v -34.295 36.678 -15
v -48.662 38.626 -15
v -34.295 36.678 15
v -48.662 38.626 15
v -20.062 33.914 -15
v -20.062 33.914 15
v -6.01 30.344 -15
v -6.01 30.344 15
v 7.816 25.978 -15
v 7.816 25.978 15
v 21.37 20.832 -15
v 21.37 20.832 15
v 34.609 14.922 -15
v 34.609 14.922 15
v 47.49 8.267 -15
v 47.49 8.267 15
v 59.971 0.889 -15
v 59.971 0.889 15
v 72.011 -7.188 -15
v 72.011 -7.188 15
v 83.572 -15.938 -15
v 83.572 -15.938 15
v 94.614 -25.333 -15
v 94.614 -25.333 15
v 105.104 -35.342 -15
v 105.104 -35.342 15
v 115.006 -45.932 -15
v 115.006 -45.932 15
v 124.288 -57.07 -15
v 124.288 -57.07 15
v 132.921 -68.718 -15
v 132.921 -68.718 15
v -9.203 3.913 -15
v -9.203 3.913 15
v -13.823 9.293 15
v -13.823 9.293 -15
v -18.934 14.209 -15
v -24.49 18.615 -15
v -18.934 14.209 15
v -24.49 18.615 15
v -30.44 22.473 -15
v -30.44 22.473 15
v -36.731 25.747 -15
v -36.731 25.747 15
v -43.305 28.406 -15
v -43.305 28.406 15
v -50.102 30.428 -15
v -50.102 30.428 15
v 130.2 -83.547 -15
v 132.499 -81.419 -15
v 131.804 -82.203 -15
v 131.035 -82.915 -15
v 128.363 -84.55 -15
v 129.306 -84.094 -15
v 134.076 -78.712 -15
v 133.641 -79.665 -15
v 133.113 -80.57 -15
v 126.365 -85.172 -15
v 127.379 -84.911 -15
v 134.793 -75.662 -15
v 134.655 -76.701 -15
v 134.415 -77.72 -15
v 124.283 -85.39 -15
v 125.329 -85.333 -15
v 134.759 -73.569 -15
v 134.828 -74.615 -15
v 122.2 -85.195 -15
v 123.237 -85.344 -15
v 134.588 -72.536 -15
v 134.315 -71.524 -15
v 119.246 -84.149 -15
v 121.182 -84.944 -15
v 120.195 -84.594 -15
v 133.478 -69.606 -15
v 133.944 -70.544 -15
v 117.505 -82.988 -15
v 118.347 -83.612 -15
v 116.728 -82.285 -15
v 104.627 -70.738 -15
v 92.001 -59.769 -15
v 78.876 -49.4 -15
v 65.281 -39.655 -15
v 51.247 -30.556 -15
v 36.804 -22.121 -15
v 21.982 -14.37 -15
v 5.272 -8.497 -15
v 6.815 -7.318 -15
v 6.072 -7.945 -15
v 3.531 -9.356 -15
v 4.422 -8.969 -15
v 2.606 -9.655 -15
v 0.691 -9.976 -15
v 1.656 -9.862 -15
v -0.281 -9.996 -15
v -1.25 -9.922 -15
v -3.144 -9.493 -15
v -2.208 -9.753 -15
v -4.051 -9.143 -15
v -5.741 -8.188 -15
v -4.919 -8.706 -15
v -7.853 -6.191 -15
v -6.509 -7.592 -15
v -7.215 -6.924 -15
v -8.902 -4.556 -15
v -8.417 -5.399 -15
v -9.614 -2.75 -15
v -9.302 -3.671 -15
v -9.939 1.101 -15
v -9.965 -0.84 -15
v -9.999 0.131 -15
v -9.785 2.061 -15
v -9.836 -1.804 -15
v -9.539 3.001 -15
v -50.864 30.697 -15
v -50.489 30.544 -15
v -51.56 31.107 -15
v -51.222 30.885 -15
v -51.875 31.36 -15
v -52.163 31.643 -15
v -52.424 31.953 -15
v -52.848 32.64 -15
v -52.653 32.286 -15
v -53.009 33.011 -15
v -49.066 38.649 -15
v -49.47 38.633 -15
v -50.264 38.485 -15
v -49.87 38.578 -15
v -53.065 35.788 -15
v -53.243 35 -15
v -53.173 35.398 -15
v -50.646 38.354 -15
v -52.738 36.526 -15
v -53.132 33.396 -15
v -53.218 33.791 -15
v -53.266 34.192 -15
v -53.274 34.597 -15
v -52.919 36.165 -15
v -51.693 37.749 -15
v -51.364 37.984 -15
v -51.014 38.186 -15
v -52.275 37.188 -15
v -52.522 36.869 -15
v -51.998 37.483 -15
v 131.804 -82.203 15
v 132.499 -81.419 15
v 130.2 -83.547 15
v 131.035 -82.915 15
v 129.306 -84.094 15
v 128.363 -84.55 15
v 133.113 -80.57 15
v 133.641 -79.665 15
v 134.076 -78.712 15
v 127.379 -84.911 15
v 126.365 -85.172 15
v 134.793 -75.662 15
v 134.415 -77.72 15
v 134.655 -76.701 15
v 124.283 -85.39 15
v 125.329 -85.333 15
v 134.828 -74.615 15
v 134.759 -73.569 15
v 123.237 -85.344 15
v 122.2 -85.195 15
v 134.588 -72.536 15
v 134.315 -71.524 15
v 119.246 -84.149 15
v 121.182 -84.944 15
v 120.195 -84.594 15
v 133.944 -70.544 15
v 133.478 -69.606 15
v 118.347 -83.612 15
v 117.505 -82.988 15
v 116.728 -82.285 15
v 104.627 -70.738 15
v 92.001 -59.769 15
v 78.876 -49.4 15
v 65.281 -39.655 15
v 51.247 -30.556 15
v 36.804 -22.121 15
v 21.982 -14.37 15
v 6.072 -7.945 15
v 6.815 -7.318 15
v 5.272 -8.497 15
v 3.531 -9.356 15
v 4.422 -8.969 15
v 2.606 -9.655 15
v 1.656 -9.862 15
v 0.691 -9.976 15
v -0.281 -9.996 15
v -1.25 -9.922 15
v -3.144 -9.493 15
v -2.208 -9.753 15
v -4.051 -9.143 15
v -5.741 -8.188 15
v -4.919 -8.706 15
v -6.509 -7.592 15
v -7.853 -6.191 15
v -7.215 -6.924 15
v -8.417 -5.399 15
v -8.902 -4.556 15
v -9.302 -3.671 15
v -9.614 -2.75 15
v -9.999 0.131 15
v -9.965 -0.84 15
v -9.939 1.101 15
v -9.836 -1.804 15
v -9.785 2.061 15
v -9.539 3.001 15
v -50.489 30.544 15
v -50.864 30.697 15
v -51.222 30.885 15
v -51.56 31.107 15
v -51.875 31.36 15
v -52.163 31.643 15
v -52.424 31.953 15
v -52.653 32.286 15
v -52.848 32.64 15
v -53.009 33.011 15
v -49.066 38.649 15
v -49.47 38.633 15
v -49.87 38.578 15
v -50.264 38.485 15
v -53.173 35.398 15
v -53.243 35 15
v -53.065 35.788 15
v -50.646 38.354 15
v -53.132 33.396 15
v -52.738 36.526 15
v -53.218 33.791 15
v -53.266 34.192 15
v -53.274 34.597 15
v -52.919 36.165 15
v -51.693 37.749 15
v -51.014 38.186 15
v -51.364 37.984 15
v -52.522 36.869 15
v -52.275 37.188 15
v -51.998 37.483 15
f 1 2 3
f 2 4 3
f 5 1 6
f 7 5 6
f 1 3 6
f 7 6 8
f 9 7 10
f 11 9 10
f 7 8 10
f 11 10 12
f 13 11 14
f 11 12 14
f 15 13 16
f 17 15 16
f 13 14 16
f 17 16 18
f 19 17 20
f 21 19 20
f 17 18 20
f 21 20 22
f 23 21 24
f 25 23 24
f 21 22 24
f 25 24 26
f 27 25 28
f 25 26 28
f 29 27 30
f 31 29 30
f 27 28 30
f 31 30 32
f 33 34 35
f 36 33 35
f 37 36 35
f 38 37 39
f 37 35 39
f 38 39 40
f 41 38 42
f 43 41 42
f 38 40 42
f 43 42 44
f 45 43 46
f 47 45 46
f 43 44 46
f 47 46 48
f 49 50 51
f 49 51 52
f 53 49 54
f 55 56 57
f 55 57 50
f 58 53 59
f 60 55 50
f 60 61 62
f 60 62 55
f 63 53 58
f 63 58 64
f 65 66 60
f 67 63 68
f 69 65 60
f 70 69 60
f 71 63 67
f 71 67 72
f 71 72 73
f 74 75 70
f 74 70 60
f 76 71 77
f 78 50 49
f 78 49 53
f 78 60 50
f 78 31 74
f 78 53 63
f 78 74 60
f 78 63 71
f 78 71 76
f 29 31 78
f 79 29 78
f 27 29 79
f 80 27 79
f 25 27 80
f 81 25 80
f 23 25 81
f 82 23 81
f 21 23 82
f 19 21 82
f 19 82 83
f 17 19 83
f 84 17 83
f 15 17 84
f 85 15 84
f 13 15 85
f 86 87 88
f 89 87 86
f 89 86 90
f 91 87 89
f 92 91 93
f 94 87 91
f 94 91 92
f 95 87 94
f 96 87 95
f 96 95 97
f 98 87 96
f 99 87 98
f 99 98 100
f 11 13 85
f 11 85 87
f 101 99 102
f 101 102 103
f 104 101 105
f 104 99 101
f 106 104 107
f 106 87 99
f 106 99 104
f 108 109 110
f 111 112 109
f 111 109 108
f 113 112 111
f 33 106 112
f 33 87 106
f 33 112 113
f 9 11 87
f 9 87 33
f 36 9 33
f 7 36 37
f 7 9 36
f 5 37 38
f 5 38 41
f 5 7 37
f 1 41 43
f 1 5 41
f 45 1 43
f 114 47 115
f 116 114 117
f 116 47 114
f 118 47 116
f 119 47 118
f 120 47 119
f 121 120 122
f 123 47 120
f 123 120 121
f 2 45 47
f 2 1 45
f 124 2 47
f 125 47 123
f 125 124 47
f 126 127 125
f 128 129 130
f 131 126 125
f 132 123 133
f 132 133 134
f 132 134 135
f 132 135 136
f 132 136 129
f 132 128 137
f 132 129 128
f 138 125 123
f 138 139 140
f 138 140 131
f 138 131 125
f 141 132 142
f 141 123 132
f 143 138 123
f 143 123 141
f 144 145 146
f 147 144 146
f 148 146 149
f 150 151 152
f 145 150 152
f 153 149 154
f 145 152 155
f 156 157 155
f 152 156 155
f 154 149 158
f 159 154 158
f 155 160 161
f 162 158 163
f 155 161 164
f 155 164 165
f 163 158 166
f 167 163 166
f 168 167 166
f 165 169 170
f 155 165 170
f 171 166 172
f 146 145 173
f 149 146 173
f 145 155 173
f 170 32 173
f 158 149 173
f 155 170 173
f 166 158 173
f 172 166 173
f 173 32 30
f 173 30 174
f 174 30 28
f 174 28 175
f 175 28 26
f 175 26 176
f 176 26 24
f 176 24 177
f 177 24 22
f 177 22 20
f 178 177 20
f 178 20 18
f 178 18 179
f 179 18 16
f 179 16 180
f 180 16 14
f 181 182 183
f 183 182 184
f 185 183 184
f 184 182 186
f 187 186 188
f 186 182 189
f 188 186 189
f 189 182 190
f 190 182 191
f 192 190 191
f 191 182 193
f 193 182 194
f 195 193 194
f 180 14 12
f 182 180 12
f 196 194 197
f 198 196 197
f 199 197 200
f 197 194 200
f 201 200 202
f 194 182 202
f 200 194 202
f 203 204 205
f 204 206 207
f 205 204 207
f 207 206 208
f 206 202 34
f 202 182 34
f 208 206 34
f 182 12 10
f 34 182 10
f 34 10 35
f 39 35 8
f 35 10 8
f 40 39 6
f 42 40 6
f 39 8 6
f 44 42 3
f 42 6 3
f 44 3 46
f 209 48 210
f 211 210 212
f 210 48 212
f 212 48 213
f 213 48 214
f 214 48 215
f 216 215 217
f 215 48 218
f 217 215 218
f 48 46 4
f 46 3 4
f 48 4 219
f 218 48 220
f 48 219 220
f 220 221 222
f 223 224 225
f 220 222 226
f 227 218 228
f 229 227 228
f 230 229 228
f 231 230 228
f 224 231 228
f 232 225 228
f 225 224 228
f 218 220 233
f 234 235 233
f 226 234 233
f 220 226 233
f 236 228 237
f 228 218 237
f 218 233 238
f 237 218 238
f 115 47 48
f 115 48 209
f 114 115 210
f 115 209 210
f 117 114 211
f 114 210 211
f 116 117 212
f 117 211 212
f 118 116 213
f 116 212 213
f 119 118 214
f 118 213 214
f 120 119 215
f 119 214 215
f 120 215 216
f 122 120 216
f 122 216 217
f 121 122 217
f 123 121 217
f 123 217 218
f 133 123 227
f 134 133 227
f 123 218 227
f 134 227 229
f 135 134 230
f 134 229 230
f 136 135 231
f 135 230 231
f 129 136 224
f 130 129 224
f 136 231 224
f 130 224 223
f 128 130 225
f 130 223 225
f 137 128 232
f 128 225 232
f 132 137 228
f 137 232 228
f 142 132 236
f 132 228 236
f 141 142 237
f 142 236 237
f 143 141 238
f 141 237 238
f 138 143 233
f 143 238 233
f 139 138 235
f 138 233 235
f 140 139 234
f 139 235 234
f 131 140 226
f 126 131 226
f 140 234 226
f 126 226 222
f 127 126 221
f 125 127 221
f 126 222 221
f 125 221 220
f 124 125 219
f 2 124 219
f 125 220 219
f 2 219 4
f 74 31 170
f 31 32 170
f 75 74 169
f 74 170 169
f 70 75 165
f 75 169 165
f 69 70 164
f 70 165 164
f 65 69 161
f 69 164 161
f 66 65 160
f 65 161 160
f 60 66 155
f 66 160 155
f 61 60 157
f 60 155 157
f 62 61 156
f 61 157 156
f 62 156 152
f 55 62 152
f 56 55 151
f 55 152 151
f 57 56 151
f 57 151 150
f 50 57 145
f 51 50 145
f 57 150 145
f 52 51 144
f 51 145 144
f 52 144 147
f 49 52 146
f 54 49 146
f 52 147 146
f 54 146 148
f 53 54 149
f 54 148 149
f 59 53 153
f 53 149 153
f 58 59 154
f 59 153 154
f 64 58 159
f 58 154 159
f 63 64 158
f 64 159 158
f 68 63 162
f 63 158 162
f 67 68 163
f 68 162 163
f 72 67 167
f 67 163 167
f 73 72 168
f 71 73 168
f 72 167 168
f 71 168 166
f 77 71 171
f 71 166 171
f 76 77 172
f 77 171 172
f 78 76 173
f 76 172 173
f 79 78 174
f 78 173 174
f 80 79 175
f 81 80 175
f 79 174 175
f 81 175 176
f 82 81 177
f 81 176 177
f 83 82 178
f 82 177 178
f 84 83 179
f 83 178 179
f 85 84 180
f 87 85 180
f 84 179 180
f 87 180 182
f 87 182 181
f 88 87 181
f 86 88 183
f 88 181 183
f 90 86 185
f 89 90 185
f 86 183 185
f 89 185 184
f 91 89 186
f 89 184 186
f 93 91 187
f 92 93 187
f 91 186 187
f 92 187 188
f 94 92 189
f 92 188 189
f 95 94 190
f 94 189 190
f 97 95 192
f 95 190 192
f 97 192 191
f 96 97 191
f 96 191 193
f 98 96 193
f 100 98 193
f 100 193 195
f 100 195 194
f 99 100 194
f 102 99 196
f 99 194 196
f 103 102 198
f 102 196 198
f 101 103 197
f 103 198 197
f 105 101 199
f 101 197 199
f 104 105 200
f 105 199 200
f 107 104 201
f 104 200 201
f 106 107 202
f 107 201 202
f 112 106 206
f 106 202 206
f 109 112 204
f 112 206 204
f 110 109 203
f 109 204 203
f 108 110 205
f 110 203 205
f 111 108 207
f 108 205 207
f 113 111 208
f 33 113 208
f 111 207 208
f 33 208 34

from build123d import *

# Parameters (mm, degrees)
EXTRUDE_1_DEPTH = 15


with BuildPart() as part:
    # 草图2 → 凸台-拉伸1 (new, symmetric)
    with BuildSketch(Plane.XY):
        with BuildLine():
            ThreePointArc((-50.101760938, 30.428374824), (-53.212480705, 35.199792857), (-48.662053388, 38.625667744))
            ThreePointArc((-48.662053388, 38.625667744), (53.783376909, 4.667316575), (132.921228365, -68.718215172))
            ThreePointArc((132.921228365, -68.718215172), (131.035363994, -82.914699935), (116.728010512, -82.285175988))
            ThreePointArc((116.728010512, -82.285175988), (65.281465021, -39.655460148), (6.814778353, -7.318387527))
            ThreePointArc((6.814778353, -7.318387527), (-5.74124488, -8.18768021), (-9.202597166, 3.913081318))
            ThreePointArc((-9.202597166, 3.913081318), (-27.419137904, 20.615137073), (-50.101760938, 30.428374824))
        make_face()
    extrude(amount=EXTRUDE_1_DEPTH, both=True)


solid = part.part
